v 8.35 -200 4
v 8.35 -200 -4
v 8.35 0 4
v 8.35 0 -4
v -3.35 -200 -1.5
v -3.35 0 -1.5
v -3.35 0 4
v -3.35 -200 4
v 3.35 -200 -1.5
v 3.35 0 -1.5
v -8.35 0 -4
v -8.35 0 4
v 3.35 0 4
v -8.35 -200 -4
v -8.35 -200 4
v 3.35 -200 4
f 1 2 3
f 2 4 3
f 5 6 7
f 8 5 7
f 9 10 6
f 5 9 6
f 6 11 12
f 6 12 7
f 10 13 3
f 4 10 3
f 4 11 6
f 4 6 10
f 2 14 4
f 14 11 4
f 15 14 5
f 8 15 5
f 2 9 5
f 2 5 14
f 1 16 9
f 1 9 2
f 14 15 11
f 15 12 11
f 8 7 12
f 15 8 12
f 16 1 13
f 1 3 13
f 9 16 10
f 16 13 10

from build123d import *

# Parameters (mm, degrees)
F1_DEPTH  = 10
F1_FACE_W = 6.7
F1_FACE_H = 10
F2_DEPTH  = 0.5
F3_DEPTH  = 190


with BuildPart() as f1:
    # F0 (on Front) → F1 (new body)
    with BuildSketch(Plane.XZ):
        Polygon((-3.35, 4), (-8.35, 4), (-8.35, -4), (8.35, -4), (8.35, 4), (3.35, 4), (3.35, -2), (-3.35, -2), align=None)
    extrude(amount=F1_DEPTH)

    # F1_face (on face) → F2 (join)
    with BuildSketch(Plane(origin=(0, -5, -2), x_dir=(1, 0, 0), z_dir=(0, 0, 1))):
        Rectangle(F1_FACE_W, F1_FACE_H)
    extrude(amount=F2_DEPTH)

    # F2_face (on face) → F3 (join)
    with BuildSketch(Plane(origin=(0, -10, -0.476098), x_dir=(1, 0, 0), z_dir=(0, -1, 0))):
        Polygon((-3.35, 4.476098), (-8.35, 4.476098), (-8.35, -3.523902), (8.35, -3.523902), (8.35, 4.476098), (3.35, 4.476098), (3.35, -1.023902), (-3.35, -1.023902), align=None)
    extrude(amount=F3_DEPTH)


solid = f1.part
